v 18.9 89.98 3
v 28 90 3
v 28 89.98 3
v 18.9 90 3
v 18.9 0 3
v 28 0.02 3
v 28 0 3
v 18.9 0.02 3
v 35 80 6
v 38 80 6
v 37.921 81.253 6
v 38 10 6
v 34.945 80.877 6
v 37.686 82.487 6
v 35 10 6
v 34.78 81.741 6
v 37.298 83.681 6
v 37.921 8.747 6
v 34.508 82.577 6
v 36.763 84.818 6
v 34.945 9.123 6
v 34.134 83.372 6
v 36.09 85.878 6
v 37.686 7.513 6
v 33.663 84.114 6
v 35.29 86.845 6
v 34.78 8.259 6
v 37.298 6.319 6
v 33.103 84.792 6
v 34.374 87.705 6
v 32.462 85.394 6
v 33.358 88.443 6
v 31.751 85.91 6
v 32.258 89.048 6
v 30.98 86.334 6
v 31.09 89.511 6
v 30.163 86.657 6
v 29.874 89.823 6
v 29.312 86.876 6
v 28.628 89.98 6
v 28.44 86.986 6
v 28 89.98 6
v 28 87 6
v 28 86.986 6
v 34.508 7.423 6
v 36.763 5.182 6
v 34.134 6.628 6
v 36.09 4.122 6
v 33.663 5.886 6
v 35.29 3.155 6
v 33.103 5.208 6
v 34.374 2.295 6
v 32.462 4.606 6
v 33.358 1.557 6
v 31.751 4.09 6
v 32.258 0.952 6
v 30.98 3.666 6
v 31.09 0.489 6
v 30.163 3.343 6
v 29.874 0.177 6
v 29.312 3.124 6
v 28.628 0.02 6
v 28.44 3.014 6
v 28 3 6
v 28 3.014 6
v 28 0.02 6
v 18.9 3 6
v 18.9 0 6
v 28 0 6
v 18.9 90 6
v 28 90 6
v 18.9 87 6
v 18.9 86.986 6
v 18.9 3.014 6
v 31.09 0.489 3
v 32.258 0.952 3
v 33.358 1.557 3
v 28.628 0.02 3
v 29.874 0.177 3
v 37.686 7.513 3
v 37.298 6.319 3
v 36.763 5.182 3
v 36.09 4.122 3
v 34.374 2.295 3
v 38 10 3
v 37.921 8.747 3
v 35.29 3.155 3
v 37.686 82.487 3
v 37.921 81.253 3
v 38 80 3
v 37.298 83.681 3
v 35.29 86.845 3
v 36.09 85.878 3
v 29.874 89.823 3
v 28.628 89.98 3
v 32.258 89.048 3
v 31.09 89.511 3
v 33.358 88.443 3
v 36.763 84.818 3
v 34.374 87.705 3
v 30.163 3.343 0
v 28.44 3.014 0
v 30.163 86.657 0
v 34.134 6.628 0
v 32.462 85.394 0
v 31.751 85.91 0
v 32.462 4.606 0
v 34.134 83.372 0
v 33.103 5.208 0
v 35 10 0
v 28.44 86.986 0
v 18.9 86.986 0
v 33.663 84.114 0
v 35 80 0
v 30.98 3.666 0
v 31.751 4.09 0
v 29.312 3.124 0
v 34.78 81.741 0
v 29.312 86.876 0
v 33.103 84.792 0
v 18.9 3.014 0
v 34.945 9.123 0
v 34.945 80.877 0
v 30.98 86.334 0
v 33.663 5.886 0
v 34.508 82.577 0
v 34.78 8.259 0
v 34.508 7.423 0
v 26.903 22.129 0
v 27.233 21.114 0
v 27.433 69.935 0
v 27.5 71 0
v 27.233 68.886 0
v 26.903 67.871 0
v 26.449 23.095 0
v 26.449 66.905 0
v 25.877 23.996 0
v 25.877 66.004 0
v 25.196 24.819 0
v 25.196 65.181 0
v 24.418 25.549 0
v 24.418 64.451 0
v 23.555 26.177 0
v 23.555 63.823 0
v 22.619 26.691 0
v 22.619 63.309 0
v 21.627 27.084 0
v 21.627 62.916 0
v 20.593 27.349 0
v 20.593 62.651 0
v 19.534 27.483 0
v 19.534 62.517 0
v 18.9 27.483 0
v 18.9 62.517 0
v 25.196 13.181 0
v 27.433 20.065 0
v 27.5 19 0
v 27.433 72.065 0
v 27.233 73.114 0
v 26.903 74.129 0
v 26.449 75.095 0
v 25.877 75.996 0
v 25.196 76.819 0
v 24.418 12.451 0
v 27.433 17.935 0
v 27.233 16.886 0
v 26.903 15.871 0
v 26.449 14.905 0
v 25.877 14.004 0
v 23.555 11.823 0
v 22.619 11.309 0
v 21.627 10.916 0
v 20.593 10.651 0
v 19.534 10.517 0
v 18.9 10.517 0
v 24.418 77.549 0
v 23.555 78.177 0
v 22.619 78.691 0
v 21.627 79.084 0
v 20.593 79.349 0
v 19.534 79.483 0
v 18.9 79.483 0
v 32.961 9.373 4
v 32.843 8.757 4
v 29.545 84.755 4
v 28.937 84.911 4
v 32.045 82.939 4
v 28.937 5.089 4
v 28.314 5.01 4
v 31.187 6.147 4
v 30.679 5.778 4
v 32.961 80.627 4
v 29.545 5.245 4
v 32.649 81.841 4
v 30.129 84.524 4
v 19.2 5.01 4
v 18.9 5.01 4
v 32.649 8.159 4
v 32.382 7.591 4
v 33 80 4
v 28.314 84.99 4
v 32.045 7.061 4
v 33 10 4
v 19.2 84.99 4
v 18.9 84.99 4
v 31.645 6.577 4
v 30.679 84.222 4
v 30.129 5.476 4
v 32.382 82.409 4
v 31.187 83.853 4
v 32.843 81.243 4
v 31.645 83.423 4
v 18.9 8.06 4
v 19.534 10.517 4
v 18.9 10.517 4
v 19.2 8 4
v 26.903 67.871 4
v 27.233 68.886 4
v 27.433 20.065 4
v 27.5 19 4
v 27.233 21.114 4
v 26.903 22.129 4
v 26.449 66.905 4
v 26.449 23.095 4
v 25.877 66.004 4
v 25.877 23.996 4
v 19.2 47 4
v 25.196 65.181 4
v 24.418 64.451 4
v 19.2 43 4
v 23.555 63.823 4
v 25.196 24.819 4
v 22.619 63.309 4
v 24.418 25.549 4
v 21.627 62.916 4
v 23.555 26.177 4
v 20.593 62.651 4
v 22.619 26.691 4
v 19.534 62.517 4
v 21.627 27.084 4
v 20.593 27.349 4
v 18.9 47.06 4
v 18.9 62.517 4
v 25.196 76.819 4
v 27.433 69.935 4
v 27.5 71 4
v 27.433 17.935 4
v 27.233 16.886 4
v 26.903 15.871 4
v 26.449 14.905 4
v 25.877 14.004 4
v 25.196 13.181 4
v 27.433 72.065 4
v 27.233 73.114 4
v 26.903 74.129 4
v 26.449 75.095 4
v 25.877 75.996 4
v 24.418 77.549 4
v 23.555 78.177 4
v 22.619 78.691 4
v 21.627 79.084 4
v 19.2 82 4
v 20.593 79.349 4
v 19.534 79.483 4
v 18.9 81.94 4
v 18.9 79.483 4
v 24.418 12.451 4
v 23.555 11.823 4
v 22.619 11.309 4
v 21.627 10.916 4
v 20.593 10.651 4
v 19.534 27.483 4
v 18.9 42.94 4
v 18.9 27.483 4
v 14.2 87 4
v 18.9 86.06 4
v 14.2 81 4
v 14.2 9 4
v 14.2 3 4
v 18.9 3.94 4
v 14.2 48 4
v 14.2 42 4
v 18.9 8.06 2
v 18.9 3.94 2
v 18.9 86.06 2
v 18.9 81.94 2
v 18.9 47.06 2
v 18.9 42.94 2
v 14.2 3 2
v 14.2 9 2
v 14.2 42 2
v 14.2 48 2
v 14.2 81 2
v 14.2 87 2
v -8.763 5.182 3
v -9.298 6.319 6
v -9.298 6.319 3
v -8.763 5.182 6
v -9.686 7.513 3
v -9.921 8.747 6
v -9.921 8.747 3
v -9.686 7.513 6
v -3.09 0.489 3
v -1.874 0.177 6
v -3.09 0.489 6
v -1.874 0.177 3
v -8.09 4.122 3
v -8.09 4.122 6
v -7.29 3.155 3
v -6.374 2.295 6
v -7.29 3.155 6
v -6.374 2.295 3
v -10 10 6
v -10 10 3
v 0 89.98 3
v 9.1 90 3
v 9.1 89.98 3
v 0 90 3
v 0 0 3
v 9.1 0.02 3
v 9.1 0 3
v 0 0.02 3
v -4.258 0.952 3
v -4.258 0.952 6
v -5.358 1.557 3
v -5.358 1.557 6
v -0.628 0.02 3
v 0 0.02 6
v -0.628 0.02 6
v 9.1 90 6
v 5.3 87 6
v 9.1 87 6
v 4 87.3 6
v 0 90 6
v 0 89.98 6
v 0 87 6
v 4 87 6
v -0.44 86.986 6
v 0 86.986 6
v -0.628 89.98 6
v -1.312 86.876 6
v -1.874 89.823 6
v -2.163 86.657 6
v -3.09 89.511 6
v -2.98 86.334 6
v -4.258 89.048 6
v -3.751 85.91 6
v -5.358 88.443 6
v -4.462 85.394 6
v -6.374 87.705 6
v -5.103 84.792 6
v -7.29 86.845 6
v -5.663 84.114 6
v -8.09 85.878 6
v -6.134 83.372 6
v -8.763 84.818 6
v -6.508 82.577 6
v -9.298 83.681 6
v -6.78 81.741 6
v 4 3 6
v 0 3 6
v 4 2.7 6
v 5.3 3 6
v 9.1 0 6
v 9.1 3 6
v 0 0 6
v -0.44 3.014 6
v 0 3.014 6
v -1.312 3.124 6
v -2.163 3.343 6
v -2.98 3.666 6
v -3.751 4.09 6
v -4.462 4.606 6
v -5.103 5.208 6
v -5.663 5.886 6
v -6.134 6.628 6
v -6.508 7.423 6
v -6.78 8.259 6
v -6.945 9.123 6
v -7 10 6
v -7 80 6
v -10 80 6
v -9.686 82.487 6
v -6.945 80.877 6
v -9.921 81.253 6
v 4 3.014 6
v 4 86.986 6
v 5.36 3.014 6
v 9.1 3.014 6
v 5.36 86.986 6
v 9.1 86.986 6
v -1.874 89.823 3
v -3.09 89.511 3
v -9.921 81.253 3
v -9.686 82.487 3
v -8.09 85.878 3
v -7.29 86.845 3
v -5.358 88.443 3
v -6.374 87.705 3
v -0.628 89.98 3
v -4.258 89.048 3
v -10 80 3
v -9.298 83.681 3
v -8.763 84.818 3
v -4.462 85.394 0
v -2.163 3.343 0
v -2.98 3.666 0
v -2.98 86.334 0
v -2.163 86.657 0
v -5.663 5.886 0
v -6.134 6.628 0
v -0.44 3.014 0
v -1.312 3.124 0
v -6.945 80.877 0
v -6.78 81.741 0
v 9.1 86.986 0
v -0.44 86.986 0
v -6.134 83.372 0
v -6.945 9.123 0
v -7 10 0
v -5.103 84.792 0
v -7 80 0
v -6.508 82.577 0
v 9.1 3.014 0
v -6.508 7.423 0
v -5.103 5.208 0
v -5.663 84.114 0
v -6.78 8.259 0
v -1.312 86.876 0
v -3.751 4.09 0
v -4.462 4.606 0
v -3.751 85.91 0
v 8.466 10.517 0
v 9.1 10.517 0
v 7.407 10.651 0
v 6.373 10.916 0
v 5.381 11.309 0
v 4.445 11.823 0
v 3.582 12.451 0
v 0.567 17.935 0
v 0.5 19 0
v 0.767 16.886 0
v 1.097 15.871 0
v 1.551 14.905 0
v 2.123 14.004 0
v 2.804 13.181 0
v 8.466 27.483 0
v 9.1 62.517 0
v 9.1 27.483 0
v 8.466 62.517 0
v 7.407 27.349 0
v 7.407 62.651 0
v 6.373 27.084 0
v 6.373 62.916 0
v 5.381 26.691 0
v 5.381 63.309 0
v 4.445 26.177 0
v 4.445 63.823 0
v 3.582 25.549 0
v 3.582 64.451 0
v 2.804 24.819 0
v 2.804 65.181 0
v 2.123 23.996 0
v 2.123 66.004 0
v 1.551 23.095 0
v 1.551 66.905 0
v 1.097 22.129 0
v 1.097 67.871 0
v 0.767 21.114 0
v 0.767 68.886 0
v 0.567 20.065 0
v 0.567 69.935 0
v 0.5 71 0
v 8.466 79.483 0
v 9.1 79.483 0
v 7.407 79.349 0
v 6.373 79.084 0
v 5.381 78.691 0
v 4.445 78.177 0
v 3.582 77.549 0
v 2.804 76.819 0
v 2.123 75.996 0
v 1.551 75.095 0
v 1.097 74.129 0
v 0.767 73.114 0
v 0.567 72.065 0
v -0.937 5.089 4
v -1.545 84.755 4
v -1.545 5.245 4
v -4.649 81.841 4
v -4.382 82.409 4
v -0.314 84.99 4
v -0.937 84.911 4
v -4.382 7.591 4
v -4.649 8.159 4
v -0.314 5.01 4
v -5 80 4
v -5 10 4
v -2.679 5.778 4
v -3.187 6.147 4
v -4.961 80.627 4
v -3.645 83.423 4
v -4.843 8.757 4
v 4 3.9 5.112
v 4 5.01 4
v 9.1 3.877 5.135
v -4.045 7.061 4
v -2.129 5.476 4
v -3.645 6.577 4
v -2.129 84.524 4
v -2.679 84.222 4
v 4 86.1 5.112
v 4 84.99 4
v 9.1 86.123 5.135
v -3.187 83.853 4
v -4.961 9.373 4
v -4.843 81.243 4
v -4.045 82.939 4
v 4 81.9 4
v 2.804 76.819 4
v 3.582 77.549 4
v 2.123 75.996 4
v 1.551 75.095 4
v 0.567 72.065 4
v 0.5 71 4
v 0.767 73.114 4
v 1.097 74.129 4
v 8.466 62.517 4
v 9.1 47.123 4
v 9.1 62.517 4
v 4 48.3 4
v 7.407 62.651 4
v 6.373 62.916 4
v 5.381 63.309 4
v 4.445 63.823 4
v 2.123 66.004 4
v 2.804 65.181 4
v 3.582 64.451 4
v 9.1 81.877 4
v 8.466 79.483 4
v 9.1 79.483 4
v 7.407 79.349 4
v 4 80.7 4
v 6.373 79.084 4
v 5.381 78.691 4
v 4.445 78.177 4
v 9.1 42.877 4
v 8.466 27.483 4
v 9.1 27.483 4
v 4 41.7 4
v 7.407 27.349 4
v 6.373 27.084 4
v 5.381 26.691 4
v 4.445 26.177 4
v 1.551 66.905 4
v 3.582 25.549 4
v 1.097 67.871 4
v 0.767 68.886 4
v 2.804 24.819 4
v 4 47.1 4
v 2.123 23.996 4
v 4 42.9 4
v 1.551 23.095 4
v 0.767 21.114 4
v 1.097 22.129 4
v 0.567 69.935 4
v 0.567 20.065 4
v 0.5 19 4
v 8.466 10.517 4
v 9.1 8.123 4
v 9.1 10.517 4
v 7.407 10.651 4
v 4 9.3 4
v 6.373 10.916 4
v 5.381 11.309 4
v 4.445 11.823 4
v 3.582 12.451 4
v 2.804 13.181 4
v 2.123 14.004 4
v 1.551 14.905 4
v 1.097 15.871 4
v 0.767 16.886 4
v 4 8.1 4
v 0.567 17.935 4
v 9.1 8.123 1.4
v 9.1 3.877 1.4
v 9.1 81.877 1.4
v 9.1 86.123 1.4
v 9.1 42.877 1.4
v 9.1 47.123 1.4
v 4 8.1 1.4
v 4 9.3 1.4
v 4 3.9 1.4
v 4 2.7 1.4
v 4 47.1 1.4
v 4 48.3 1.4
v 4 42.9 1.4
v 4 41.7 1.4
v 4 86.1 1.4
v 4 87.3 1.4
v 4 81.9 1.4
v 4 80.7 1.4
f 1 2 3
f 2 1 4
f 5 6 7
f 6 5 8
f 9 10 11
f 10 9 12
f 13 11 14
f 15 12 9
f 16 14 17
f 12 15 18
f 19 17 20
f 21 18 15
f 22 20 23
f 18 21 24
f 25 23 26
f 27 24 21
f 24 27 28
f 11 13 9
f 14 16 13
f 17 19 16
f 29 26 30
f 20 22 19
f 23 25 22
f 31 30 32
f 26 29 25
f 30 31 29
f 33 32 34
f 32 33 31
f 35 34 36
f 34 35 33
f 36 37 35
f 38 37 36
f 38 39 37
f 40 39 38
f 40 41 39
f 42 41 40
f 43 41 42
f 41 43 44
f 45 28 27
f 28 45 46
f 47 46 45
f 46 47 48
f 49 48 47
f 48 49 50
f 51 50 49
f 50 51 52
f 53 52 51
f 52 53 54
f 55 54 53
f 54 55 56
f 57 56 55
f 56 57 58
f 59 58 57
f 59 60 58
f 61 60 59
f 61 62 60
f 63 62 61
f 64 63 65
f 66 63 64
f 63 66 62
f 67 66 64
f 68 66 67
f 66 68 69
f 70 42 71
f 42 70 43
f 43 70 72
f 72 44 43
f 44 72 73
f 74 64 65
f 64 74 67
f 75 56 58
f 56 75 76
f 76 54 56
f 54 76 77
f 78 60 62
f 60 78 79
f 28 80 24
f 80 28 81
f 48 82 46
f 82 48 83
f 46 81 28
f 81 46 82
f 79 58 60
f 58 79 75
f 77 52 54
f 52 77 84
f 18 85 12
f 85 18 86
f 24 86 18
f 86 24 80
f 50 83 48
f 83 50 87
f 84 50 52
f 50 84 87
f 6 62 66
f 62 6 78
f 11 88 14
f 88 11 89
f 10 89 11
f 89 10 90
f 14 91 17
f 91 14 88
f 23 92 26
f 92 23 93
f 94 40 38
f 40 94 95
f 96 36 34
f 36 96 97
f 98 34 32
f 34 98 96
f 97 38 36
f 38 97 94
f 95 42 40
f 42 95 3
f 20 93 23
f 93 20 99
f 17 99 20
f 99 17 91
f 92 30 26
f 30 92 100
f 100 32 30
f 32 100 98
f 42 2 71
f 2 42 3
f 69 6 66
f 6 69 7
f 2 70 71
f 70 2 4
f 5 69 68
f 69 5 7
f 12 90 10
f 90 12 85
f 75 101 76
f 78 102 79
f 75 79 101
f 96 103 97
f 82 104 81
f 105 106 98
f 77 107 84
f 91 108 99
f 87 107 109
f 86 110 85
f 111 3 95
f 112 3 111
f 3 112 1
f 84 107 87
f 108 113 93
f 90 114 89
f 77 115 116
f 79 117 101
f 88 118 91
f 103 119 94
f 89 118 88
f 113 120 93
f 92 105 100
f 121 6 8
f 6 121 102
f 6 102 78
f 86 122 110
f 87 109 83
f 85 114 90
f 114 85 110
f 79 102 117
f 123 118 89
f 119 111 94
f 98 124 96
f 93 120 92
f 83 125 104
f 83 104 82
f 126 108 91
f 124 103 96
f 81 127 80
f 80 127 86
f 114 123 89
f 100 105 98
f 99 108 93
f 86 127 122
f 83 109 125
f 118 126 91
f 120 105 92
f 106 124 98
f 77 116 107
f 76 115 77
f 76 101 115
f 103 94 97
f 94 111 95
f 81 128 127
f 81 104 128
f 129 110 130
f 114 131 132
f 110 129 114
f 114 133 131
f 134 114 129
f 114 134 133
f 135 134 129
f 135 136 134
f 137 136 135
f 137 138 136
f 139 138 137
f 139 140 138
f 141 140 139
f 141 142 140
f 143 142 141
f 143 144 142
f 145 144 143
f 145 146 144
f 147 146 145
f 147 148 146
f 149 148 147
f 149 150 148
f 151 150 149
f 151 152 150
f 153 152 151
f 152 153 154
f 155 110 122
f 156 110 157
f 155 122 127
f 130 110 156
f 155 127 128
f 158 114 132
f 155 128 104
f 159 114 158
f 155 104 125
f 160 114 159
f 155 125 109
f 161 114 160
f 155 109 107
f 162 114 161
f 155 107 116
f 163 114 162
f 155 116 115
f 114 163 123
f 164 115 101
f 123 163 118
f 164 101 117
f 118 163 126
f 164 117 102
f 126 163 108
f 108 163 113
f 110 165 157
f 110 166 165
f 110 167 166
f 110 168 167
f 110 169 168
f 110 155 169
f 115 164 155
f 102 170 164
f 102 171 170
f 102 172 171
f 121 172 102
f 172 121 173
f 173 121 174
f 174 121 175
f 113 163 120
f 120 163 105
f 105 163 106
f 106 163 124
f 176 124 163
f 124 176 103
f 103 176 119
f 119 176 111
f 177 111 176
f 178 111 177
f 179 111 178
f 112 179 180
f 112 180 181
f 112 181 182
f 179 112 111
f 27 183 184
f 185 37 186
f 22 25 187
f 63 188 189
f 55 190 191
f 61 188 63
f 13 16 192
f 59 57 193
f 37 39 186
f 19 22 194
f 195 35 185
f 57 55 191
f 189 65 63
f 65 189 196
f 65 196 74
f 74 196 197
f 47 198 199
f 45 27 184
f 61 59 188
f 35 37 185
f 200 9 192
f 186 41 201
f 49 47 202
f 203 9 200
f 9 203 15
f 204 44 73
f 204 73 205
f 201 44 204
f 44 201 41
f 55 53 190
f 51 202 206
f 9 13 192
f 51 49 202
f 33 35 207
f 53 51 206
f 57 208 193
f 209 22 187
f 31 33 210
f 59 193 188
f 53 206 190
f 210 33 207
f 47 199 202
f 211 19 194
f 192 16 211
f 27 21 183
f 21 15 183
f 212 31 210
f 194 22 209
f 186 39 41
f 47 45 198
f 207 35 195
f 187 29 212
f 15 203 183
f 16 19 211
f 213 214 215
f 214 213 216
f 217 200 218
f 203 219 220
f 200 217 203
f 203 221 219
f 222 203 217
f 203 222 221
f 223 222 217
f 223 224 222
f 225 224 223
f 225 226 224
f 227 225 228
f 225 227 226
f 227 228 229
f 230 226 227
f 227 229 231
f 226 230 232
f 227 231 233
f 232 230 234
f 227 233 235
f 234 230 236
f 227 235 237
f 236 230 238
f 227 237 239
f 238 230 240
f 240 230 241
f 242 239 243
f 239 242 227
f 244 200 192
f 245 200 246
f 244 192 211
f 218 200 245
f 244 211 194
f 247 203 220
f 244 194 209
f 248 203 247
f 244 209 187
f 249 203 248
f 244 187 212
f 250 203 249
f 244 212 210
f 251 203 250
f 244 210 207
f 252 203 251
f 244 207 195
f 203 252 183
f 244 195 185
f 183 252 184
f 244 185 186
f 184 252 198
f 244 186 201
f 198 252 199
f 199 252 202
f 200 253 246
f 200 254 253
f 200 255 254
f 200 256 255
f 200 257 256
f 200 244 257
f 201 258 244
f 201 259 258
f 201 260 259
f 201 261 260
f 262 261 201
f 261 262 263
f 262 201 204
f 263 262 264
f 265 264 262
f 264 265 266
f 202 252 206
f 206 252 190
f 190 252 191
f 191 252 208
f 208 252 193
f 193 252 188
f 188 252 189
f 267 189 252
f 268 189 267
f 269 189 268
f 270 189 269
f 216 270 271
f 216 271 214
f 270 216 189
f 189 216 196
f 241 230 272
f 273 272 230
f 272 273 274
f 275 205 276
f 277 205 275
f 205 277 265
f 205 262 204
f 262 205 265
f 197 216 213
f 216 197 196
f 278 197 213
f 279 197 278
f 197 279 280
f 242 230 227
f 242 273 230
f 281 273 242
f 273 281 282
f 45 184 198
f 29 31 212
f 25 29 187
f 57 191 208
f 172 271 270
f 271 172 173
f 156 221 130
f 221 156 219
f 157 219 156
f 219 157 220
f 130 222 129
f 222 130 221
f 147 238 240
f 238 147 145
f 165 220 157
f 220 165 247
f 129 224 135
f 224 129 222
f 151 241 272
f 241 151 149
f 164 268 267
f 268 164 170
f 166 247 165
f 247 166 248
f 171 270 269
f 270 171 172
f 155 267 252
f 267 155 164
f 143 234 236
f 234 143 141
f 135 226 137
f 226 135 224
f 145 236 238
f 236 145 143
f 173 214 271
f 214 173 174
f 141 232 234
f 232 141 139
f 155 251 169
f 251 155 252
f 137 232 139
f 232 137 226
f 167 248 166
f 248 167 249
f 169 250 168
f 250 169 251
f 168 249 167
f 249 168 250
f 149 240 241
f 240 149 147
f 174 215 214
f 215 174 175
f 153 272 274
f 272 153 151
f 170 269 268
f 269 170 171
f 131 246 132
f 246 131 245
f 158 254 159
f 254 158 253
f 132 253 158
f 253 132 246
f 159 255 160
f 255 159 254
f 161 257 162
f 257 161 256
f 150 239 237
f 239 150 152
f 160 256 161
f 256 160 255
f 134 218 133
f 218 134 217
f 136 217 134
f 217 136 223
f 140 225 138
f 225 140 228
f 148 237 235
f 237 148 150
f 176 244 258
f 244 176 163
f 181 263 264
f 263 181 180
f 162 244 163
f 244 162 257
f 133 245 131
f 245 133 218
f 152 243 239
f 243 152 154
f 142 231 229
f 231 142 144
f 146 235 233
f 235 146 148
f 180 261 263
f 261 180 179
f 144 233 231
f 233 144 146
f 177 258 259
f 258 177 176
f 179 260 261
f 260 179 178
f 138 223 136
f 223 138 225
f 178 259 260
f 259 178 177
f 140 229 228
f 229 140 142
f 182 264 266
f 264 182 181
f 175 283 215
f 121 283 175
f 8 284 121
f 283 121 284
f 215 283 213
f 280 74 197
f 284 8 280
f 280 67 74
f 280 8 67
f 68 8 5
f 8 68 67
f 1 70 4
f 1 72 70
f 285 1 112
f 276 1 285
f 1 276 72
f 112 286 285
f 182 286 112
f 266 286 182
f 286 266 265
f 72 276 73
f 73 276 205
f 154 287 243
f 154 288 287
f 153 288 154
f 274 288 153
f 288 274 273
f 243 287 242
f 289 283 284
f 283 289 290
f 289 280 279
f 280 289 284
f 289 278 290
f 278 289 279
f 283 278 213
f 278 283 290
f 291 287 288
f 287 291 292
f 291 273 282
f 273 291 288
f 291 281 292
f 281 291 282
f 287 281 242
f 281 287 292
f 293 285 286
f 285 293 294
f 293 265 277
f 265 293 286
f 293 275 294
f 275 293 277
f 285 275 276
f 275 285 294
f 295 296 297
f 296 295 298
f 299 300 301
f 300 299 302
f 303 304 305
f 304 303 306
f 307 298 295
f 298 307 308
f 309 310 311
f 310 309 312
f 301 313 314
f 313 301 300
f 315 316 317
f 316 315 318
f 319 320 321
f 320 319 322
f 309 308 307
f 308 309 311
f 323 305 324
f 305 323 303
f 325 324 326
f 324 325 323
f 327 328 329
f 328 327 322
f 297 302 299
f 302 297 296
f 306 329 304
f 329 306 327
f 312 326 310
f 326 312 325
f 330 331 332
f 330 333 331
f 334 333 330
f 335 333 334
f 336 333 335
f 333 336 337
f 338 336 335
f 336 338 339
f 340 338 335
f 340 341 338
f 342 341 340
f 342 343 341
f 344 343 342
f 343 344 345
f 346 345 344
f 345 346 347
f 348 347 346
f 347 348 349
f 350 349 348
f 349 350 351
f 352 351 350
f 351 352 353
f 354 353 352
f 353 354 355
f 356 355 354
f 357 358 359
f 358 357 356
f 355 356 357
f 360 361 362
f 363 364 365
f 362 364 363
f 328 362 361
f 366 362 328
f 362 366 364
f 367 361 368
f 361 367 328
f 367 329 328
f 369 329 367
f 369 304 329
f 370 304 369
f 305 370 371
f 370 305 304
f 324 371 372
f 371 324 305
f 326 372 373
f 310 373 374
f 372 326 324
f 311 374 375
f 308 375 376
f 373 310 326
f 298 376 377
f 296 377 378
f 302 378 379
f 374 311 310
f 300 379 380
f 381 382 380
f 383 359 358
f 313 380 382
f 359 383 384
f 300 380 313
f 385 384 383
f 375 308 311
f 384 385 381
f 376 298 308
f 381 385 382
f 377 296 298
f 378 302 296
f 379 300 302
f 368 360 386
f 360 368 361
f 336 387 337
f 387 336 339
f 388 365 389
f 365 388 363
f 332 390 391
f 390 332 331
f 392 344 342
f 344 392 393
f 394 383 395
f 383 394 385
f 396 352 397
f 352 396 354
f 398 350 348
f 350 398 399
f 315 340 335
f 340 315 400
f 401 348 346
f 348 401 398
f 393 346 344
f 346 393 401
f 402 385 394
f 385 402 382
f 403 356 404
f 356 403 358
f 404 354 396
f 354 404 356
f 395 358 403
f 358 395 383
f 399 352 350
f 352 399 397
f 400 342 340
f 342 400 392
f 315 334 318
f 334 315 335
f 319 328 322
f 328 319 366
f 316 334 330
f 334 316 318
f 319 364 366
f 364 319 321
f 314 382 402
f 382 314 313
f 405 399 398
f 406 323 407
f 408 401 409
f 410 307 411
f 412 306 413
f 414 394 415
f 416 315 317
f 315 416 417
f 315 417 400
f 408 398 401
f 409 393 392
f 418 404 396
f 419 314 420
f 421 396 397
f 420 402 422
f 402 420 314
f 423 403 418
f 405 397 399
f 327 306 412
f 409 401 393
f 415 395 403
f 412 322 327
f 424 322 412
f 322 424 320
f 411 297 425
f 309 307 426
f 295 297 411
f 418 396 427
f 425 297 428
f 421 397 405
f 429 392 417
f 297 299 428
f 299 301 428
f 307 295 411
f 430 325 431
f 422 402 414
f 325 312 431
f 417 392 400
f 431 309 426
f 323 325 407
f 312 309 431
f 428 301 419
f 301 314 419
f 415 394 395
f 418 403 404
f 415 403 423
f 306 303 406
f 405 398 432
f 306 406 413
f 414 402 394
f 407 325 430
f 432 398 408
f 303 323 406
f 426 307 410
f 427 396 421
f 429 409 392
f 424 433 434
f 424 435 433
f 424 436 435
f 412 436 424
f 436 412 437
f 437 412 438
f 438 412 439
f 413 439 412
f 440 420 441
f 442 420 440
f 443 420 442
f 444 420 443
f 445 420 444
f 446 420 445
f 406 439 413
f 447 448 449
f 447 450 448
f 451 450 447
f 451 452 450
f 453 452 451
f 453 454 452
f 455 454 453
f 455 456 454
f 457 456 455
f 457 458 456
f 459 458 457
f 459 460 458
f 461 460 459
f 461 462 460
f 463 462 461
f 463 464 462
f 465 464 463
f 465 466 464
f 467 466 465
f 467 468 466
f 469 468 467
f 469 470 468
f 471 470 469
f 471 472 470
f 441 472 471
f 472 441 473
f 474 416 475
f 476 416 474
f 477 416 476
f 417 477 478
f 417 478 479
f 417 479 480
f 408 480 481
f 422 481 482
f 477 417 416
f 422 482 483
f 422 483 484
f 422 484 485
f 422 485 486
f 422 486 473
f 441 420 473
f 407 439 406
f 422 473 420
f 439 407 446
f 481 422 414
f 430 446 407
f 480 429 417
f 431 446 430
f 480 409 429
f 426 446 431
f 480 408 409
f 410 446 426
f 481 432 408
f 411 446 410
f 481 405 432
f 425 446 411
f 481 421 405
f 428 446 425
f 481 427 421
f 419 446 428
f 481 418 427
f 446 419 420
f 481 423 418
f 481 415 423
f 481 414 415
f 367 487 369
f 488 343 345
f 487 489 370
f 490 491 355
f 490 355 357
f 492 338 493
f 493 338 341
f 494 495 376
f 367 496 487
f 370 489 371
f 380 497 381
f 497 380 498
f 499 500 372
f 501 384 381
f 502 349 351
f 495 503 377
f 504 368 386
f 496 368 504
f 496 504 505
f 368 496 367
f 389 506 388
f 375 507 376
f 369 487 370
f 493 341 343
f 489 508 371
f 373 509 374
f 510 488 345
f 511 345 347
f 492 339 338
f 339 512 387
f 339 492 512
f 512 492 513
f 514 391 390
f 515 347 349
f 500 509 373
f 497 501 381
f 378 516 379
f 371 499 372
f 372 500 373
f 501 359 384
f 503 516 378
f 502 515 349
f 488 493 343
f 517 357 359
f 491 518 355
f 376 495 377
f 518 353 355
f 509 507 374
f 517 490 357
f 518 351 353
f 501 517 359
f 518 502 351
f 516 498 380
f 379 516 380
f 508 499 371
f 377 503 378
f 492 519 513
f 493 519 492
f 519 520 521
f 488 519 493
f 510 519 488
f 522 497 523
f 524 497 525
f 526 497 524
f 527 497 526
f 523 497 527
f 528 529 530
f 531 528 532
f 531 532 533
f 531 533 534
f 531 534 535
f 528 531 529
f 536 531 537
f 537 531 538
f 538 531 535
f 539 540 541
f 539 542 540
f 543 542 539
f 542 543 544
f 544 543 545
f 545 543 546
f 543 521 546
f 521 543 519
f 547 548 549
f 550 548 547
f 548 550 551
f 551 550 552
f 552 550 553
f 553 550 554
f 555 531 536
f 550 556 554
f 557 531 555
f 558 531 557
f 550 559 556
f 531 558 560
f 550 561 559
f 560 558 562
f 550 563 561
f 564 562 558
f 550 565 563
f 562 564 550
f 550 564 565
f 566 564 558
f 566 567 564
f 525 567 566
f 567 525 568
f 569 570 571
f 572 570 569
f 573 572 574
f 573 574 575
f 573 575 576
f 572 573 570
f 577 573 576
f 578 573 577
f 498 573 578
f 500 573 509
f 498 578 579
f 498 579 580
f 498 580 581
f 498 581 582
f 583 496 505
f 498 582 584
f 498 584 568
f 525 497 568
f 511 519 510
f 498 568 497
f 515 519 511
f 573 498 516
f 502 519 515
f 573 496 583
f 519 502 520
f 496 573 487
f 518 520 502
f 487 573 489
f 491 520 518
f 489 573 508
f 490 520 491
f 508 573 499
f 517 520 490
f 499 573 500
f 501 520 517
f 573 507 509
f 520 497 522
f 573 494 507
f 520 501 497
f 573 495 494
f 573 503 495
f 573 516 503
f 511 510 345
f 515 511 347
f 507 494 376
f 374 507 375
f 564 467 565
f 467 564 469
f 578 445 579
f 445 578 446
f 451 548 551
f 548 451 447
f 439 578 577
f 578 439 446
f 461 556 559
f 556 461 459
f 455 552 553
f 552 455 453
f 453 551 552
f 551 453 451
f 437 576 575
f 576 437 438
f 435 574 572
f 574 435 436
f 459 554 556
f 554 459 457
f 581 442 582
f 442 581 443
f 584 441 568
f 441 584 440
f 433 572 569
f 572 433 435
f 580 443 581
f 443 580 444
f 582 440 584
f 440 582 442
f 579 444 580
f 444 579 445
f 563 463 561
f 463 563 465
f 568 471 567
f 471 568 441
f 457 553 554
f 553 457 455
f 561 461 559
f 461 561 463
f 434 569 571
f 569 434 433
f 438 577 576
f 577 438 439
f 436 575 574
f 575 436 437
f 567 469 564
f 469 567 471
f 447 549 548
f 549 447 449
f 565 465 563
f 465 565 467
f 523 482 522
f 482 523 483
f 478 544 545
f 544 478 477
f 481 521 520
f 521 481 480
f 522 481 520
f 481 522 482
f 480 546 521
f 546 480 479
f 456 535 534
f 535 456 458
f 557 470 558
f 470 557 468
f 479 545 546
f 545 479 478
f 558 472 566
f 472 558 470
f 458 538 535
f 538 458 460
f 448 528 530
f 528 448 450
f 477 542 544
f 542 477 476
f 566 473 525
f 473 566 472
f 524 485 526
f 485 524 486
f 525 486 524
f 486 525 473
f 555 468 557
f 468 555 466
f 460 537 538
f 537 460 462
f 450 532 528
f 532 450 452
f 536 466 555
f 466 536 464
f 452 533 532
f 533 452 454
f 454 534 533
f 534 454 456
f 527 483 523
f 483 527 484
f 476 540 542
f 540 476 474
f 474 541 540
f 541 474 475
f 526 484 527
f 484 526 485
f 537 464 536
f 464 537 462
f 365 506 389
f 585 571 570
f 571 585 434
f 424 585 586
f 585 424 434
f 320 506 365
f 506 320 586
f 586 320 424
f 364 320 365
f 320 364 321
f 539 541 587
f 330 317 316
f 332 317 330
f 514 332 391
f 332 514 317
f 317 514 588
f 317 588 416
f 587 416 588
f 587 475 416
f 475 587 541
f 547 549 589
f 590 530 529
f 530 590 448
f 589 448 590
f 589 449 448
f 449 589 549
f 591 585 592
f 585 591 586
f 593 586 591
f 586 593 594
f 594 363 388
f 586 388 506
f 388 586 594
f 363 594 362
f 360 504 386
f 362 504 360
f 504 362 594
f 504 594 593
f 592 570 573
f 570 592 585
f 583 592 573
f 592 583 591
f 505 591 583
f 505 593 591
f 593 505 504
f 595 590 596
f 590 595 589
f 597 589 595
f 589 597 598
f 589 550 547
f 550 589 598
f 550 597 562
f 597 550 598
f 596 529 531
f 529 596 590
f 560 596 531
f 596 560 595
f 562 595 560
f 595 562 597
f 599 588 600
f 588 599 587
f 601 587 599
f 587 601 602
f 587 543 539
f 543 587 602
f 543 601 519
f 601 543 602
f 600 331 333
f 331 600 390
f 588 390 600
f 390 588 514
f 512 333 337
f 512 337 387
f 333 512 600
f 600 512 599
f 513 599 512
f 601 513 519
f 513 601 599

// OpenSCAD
// file: dining_room_config.scad
use <./_cfg.scad>

// Dining Room Configuration Functions
function get_h() = 6;
function get_width() = 38;
function get_length() = 90;
function get_diameter() = 17;
function get_distance() = 52;
function get_nutDistance() = 6;
function get_separation() = 10;
function get_offset_l() = 0;
function get_offset_r() = 0;
// file: _cfg.scad
// Global configuration functions
function get_fn() = 50;
function get_darft() = false;
// file: base.scad
module base(h, width, length, diameter, distance, offset_l=0, offset_r=0, fn) {
    corner_radius=10;

    difference() {
        union() {
            difference() {
                _base_plate_shape(corner_radius, h, width, length, fn);
                translate([3,3,h-2]) {
                    offset=3;
                    _base_plate_shape(corner_radius-offset, h-2, width-offset*2, length-offset*2, fn);
                }
            }
        }

        translate([width/2, length/2-distance/2, -.1]) {
            translate([offset_l, 0, 0])
            cylinder(d=diameter, h=h+.2, center=false, $fn=fn);
            translate([offset_r, distance, 0]) {
                cylinder(d=diameter, h=h+.2, center=false, $fn=fn);
            }
        }
    }
}

module rounded_top_only(corner_radius, h, width, length, fn) {
    minkowski() {
        _base_plate_shape(corner_radius, h - corner_radius, width, length, fn);
        translate([0, 0, corner_radius]) cylinder(r=corner_radius/2, h=0.001, $fn=fn);
    }
}

module _base_plate_shape(corner_radius, h, width, length, fn) {
    hs=h/2;
    hn=h-hs;

    translate([0, 0, hs])

    union() {
        translate([corner_radius, 0, 0])
            cube([width - corner_radius * 2, length, hn], center=false);

        translate([0, corner_radius, 0])
            cube([width, length - corner_radius * 2, hn], center=false);

        for (x = [corner_radius, width - corner_radius])
        for (y = [corner_radius, length - corner_radius])
        translate([x, y, 0])
            cylinder(d = corner_radius * 2, h = hn, center = false, $fn = fn);

        // -------

        hull() {
            for (x = [corner_radius, width - corner_radius])
            for (y = [corner_radius, length - corner_radius])
            translate([x, y, 0])
                translate([0, 0, -hs])
                    cylinder(r1=corner_radius-hs, r2=corner_radius, h = hs, center = false, $fn = fn);
        }
    }
}

module nut(h,extend=0) {
    nut_height=h;
    nut_width=5+extend;
    nut_length=4+extend;
    nut_length_=1+extend;
    rotate([0,0,90]) {
        translate([-nut_length/2,0,0]) {
            linear_extrude(height=nut_height)
                polygon(points=[[0,0], [-nut_length_,nut_width], [0,nut_width]]);

            translate([nut_length,0,0]) {
                linear_extrude(height=nut_height)
                    polygon(points=[[0,0], [nut_length_,nut_width], [0,nut_width]]);
            }

            cube([nut_length, nut_width, nut_height], center=false);
        }
    }
}

module both(h, width, length, diameter, distance, nutDistance, separation, offset_l=0, offset_r=0, fn) {
    left(h, width, length, diameter, distance, nutDistance, offset_l, offset_r, fn);

    translate([-separation, 0, 0])
        right(h, width, length, diameter, distance, nutDistance, offset_l, offset_r, fn);
}

module left(h, width, length, diameter, distance, nutDistance, offset_l=0, offset_r=0, fn) {
    union() {
        translate([0, 0, 0]) {
            difference() {
                base(h, width, length, diameter, distance, offset_l, offset_r, fn);
                translate([-.1, -.1, -.1]) {
                    cube([width / 2, length + .2, h + .2], center = false);
                }
            }
        }

        translate([0.2,0,2])
            translate([width / 2, 0, 0]) {
                translate([0, nutDistance, 0]) {
                    nut(h - 4);
                }
                translate([0, length / 2, 0]) {
                    nut(h - 4);
                }
                translate([0, length - nutDistance, 0]) {
                    nut(h - 4);
                }
            }
    }
}

module right(h, width, length, diameter, distance, nutDistance, offset_l=0, offset_r=0, fn) {
    difference() {
        union() {
            difference() {
                base(h, width, length, diameter, distance, offset_l, offset_r, fn);
                translate([width / 2 + .1, -.1, -.1]) {
                    cube([width / 2, length + .2, h + .2], center = false);
                }
            }
        }

        translate([0.2,0,1.5])
            translate([width / 2 , 0, -.1]) {
                translate([0, nutDistance, 0]) {
                    nut(h - 1.3, extend = .2);
                }
                translate([0, length / 2, 0]) {
                    nut(h - 1.3, extend = .2);
                }
                translate([0, length - nutDistance, 0]) {
                    nut(h - 1.3, extend =  .2);
                }
            }
    }
}
// main file
use <./base.scad>
use <./_cfg.scad>
use <./dining_room_config.scad>

both(
    h=get_h(),
    width=get_width(),
    length=get_length(),
    diameter=get_diameter(),
    distance=get_distance(),
    nutDistance=get_nutDistance(),
    separation=get_separation(),
    offset_l=get_offset_l(),
    offset_r=get_offset_r(),
    fn=get_fn()
);
